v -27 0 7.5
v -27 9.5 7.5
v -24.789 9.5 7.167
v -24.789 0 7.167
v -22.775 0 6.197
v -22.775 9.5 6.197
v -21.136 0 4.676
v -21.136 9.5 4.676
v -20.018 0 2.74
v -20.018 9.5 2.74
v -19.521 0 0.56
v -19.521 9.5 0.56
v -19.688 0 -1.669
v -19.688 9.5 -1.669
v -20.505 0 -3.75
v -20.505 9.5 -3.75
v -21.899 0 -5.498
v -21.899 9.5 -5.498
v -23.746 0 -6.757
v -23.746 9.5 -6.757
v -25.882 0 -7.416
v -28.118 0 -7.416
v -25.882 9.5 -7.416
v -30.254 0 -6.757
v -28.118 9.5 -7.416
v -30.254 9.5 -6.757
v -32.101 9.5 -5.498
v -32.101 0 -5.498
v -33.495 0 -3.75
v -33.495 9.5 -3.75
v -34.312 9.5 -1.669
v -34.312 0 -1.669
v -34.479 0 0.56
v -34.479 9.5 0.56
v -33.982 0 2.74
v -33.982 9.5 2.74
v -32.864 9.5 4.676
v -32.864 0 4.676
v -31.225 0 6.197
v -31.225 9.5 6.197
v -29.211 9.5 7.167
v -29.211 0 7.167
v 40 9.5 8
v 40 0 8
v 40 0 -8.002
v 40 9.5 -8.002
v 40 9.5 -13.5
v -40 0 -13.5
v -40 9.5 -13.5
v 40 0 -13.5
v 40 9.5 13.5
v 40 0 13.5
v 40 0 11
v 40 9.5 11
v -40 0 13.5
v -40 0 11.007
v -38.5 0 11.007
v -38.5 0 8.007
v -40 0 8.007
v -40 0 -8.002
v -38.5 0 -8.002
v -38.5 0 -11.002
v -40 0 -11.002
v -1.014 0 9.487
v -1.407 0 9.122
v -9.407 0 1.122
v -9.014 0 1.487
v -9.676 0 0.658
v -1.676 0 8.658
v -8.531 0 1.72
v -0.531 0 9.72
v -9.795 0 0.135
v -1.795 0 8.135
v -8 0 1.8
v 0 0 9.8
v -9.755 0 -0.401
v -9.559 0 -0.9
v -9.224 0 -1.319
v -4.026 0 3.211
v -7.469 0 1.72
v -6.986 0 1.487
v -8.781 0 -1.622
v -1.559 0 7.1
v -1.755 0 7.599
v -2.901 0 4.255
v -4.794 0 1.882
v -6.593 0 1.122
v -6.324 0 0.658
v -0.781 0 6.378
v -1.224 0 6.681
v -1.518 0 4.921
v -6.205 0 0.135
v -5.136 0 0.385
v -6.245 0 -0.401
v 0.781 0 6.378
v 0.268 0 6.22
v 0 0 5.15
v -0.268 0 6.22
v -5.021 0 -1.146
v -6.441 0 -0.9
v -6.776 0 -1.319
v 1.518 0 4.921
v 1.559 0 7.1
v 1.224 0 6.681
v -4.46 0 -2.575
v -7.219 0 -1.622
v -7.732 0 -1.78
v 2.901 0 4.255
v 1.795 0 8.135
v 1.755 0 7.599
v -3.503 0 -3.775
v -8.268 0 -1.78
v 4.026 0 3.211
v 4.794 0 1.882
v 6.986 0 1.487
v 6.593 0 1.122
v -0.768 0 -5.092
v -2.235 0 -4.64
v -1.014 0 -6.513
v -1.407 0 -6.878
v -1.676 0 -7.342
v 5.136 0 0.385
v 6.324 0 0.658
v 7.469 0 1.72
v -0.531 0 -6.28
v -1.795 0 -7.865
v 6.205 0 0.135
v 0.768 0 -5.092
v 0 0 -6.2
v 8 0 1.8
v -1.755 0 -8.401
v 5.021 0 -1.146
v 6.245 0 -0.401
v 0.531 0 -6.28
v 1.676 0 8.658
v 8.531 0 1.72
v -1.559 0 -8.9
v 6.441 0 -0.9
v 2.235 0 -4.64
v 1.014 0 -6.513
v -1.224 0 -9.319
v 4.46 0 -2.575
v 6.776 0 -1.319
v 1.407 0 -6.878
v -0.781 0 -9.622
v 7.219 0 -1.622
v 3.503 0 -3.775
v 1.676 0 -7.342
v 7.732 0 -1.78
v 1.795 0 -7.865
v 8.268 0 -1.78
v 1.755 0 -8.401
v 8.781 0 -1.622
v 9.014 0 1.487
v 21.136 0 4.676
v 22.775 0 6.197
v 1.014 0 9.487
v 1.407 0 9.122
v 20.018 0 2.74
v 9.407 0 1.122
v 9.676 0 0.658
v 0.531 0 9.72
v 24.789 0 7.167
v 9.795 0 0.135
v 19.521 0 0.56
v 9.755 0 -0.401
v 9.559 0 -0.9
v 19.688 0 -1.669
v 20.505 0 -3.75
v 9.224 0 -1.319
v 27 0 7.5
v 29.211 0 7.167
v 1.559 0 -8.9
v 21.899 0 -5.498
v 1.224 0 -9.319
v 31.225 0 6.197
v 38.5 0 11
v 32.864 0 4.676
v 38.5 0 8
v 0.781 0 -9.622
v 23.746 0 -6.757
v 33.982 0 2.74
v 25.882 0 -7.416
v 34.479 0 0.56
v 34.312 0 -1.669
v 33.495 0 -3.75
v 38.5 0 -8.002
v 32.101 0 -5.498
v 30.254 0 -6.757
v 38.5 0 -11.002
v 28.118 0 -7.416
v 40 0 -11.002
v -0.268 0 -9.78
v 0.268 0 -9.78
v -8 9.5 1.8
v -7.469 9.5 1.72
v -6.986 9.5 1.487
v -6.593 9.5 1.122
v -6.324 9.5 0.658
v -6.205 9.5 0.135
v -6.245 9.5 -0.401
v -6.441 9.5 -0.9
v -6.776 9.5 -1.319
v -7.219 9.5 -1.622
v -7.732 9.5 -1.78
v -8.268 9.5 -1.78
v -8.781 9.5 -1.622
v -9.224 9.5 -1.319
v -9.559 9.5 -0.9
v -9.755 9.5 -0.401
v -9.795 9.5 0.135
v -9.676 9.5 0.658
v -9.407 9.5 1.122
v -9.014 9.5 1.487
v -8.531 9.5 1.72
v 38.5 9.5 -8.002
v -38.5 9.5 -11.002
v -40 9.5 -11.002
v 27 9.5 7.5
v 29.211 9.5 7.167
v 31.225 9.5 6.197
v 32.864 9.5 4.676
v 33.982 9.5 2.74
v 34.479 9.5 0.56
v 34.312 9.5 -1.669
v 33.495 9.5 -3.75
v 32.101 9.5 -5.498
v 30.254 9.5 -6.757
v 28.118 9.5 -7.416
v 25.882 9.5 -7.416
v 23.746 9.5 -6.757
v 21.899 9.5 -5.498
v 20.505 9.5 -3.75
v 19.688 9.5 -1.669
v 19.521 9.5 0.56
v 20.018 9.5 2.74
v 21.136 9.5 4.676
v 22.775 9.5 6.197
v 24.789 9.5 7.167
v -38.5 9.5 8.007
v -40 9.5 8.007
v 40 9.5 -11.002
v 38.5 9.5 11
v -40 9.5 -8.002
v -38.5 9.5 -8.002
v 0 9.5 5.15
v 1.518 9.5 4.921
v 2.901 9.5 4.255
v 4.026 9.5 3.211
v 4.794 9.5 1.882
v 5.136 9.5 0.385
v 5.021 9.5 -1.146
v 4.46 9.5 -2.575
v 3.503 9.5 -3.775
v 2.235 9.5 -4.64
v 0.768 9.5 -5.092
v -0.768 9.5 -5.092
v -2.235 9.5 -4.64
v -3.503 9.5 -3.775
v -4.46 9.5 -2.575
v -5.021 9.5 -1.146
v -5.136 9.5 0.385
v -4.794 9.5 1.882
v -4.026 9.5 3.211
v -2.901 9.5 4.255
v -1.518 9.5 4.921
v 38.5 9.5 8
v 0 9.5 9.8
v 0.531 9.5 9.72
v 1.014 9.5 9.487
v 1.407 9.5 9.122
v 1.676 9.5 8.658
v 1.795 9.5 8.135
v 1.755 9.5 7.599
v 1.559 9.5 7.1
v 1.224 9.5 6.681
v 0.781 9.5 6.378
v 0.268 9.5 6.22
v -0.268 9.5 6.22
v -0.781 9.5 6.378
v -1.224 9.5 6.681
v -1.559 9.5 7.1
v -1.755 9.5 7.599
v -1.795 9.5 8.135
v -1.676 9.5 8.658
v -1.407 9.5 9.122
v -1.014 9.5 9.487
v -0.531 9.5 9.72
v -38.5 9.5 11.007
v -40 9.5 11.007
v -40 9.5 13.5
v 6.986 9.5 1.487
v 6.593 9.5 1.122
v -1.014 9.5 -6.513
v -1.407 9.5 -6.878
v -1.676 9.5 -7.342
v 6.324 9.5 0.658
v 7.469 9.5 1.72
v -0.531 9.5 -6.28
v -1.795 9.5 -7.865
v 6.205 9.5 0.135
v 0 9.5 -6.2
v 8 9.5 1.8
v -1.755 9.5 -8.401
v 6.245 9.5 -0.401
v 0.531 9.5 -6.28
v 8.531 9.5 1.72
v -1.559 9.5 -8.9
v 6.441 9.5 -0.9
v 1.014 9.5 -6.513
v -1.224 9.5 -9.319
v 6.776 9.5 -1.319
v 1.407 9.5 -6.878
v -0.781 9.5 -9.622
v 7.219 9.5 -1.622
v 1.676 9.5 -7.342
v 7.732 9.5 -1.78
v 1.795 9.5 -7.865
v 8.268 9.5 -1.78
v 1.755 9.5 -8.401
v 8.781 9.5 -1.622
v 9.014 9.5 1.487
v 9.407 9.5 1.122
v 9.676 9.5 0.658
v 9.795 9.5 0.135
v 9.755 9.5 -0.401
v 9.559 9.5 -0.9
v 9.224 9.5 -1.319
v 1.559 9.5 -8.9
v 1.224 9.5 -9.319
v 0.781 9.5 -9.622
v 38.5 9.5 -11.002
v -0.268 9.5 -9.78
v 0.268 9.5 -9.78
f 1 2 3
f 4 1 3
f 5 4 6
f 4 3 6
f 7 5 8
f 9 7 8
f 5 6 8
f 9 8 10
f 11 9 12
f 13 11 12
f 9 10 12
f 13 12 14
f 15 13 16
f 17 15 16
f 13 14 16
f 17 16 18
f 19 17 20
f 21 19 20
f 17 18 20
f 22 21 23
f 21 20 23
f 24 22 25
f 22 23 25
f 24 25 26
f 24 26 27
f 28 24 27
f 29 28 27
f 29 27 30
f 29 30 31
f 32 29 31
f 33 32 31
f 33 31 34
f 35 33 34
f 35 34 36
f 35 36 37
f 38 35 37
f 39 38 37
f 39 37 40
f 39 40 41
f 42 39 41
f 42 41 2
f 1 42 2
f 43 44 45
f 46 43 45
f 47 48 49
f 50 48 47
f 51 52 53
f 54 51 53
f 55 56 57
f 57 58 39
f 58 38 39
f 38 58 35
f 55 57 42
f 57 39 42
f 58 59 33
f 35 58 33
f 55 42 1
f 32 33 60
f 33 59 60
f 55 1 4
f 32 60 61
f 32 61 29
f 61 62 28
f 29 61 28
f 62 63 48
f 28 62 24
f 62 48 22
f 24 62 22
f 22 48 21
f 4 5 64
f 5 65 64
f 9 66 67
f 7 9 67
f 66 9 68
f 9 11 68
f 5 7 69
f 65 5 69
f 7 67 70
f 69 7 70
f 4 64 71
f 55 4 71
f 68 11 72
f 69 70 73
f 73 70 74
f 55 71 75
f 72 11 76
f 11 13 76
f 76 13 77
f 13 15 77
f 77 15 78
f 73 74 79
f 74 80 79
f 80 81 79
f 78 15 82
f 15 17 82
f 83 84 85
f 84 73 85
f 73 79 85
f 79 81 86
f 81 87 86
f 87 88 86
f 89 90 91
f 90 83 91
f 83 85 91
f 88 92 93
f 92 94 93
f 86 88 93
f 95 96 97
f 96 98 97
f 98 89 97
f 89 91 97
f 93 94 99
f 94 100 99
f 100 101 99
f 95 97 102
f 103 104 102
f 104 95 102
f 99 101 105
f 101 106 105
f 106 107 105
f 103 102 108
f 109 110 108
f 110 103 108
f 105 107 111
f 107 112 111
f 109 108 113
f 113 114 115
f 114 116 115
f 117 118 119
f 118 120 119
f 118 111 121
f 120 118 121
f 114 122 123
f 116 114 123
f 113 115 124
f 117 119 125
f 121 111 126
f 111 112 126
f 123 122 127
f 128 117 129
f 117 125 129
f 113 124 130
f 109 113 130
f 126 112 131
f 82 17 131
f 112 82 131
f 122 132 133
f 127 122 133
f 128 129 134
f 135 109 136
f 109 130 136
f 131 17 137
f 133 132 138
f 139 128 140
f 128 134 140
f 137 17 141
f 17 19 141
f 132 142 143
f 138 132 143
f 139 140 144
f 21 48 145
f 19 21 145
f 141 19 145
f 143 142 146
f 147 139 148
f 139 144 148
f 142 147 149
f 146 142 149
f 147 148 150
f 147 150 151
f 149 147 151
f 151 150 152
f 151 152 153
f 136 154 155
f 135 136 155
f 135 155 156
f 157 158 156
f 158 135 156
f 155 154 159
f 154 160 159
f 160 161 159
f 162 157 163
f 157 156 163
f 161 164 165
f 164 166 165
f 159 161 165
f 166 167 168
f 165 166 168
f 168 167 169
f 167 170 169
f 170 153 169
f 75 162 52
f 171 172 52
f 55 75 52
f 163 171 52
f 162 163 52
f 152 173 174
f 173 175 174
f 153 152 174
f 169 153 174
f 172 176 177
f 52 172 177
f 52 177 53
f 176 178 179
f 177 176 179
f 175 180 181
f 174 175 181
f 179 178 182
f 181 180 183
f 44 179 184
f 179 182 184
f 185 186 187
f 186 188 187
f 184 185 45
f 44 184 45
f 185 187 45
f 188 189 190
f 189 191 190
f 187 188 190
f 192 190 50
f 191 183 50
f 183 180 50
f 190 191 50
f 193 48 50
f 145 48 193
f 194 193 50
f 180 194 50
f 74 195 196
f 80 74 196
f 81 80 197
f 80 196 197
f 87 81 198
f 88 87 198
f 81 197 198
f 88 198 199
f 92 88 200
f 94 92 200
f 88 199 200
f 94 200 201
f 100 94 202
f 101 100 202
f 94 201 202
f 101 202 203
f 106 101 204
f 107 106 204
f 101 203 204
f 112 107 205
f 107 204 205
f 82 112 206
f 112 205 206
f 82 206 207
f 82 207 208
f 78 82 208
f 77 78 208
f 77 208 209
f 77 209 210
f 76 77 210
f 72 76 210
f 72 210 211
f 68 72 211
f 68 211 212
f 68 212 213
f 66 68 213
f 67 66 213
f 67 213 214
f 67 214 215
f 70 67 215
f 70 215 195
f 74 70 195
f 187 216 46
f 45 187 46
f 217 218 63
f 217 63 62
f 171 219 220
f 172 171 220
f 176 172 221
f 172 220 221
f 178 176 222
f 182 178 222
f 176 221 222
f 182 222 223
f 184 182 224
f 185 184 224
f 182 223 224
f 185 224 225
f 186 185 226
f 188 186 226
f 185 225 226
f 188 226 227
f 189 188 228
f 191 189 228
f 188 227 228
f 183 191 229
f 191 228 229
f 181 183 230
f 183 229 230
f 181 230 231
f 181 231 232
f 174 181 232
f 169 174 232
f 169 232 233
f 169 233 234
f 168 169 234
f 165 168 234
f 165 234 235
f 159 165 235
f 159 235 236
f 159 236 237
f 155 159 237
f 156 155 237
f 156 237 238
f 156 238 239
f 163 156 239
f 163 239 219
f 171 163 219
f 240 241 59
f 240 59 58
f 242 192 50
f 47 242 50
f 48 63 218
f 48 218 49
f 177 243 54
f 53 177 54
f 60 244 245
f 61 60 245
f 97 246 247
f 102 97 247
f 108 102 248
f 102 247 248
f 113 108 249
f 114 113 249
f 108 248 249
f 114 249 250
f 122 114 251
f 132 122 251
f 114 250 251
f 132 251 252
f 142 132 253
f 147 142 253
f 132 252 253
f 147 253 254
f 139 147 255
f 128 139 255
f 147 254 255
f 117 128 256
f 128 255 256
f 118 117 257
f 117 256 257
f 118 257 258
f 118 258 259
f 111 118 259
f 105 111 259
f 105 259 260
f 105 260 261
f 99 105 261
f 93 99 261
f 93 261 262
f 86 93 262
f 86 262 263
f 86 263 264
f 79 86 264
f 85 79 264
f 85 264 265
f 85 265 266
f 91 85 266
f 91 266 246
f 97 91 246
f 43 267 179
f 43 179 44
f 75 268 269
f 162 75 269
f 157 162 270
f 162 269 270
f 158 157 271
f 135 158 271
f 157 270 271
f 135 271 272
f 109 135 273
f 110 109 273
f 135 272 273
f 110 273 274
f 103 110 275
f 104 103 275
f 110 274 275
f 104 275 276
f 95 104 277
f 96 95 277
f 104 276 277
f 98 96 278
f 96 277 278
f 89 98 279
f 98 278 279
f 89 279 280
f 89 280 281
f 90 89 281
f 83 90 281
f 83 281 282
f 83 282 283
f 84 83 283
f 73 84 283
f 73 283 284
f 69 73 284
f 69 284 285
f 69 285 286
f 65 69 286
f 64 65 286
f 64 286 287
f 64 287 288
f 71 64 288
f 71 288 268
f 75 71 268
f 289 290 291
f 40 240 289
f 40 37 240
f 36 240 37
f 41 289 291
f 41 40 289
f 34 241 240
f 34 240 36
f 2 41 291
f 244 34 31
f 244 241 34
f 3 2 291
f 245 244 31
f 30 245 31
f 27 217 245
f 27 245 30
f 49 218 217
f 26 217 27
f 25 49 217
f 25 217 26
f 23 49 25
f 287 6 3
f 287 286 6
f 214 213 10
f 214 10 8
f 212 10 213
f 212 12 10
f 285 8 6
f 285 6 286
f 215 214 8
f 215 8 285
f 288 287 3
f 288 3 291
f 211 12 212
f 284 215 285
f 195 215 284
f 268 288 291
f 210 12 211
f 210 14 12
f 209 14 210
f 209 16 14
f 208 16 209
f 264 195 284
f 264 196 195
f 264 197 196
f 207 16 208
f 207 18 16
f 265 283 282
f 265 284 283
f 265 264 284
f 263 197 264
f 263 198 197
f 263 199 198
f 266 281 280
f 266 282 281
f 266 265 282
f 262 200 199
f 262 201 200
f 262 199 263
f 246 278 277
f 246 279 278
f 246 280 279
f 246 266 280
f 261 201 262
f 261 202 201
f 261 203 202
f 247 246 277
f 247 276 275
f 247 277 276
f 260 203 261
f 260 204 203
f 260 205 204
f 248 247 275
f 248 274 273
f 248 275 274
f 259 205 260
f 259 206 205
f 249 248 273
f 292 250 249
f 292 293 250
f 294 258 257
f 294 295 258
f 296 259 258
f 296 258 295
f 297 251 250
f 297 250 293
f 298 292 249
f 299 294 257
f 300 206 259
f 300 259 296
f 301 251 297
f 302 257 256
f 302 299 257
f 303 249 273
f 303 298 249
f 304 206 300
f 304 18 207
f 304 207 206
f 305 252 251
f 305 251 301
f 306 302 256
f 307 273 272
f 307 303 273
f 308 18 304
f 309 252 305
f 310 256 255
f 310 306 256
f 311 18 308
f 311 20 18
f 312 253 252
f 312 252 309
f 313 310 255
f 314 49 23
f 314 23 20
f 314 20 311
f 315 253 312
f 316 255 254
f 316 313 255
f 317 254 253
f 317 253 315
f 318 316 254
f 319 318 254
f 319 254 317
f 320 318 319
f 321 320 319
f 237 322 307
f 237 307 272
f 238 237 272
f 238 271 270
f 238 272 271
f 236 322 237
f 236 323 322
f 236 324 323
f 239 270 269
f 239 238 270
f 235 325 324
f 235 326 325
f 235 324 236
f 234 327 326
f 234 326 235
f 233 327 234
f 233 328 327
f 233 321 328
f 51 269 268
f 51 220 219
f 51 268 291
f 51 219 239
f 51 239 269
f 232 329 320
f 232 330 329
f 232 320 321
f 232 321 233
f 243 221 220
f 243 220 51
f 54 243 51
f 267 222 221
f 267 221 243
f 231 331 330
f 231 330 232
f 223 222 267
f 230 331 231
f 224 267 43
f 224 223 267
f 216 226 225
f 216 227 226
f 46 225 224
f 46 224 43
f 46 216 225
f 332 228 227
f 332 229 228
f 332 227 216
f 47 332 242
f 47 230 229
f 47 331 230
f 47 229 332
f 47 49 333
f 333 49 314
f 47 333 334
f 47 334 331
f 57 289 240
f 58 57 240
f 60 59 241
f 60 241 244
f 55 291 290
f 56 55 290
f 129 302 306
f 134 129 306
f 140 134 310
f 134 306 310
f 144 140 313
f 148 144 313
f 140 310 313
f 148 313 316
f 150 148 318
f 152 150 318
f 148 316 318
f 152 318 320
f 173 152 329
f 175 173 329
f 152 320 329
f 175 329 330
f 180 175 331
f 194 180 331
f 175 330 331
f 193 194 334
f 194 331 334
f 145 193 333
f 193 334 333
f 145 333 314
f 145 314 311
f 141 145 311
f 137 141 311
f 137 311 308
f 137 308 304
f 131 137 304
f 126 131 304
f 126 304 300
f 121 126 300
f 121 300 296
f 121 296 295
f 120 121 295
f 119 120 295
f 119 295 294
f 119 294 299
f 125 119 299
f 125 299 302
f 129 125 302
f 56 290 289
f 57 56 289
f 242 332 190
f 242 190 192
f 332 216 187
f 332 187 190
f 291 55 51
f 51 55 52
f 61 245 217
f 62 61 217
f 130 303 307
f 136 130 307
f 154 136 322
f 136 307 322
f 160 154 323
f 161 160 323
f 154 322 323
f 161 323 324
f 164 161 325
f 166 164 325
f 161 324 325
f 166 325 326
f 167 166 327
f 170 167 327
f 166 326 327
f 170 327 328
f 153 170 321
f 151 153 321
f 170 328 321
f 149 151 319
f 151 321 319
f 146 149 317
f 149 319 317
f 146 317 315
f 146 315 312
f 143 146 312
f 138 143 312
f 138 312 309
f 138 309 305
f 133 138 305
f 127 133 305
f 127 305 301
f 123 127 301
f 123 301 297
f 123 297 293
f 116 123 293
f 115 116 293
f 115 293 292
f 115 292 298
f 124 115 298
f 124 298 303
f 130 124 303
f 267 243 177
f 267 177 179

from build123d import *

# Parameters (mm, degrees)
SKETCH_1_W          = 80
SKETCH_1_H          = 27
EXTRUDE_1_DEPTH     = 9.5
SKETCH_3_R          = 7.5
CUT_EXTRUDE_1_DEPTH = 44.272393047
SKETCH_4_R          = 5.15
CUT_EXTRUDE_2_DEPTH = 44.272393047
SKETCH_5_R          = 1.8
CUT_EXTRUDE_3_DEPTH = 44.272393047
SKETCH_7_W          = 1.5
SKETCH_7_H          = 3
CUT_EXTRUDE_4_DEPTH = 44.272393047


with BuildPart() as part:
    # 草图1 → 凸台-拉伸1 (new body)
    with BuildSketch(Plane(origin=(0, 0, 0), x_dir=(1, 0, 0), z_dir=(0, 1, 0))):
        Rectangle(SKETCH_1_W, SKETCH_1_H)
    extrude(amount=EXTRUDE_1_DEPTH)

    # 草图3 → 切除-拉伸1 (cut, through all)
    with BuildSketch(Plane(origin=(0, 9.5, 0), x_dir=(1, 0, 0), z_dir=(0, 1, 0))):
        with Locations(Location((-27, 0, 0), (0, 0, 270))):
            Circle(SKETCH_3_R)
        with Locations(Location((27, 0, 0), (0, 0, 270))):
            Circle(SKETCH_3_R)
    extrude(amount=-CUT_EXTRUDE_1_DEPTH, mode=Mode.SUBTRACT)

    # 草图4 → 切除-拉伸2 (cut, through all)
    with BuildSketch(Plane(origin=(0, 9.5, 0), x_dir=(1, 0, 0), z_dir=(0, 1, 0))):
        with Locations(Location((0, 0, 0), (0, 0, 270))):
            Circle(SKETCH_4_R)
    extrude(amount=-CUT_EXTRUDE_2_DEPTH, mode=Mode.SUBTRACT)

    # 草图5 → 切除-拉伸3 (cut, through all)
    with BuildSketch(Plane(origin=(0, 9.5, 0), x_dir=(1, 0, 0), z_dir=(0, 1, 0))):
        with Locations(Location((8, 0, 0), (0, 0, 270))):
            Circle(SKETCH_5_R)
        with Locations(Location((-8, 0, 0), (0, 0, 270))):
            Circle(SKETCH_5_R)
        with Locations(Location((0, 8, 0), (0, 0, 270))):
            Circle(SKETCH_5_R)
        with Locations(Location((0, -8, 0), (0, 0, 270))):
            Circle(SKETCH_5_R)
    extrude(amount=-CUT_EXTRUDE_3_DEPTH, mode=Mode.SUBTRACT)

    # 草图7 → 切除-拉伸4 (cut, through all)
    with BuildSketch(Plane(origin=(0, 9.5, 0), x_dir=(1, 0, 0), z_dir=(0, 1, 0))):
        with Locations((39.25, 9.501563289)):
            Rectangle(SKETCH_7_W, SKETCH_7_H)
        with Locations((39.25, -9.49986112)):
            Rectangle(SKETCH_7_W, SKETCH_7_H)
        with Locations((-39.25, 9.501563289)):
            Rectangle(SKETCH_7_W, SKETCH_7_H)
        with Locations((-39.25, -9.506798333)):
            Rectangle(SKETCH_7_W, SKETCH_7_H)
    extrude(amount=-CUT_EXTRUDE_4_DEPTH, mode=Mode.SUBTRACT)


solid = part.part
